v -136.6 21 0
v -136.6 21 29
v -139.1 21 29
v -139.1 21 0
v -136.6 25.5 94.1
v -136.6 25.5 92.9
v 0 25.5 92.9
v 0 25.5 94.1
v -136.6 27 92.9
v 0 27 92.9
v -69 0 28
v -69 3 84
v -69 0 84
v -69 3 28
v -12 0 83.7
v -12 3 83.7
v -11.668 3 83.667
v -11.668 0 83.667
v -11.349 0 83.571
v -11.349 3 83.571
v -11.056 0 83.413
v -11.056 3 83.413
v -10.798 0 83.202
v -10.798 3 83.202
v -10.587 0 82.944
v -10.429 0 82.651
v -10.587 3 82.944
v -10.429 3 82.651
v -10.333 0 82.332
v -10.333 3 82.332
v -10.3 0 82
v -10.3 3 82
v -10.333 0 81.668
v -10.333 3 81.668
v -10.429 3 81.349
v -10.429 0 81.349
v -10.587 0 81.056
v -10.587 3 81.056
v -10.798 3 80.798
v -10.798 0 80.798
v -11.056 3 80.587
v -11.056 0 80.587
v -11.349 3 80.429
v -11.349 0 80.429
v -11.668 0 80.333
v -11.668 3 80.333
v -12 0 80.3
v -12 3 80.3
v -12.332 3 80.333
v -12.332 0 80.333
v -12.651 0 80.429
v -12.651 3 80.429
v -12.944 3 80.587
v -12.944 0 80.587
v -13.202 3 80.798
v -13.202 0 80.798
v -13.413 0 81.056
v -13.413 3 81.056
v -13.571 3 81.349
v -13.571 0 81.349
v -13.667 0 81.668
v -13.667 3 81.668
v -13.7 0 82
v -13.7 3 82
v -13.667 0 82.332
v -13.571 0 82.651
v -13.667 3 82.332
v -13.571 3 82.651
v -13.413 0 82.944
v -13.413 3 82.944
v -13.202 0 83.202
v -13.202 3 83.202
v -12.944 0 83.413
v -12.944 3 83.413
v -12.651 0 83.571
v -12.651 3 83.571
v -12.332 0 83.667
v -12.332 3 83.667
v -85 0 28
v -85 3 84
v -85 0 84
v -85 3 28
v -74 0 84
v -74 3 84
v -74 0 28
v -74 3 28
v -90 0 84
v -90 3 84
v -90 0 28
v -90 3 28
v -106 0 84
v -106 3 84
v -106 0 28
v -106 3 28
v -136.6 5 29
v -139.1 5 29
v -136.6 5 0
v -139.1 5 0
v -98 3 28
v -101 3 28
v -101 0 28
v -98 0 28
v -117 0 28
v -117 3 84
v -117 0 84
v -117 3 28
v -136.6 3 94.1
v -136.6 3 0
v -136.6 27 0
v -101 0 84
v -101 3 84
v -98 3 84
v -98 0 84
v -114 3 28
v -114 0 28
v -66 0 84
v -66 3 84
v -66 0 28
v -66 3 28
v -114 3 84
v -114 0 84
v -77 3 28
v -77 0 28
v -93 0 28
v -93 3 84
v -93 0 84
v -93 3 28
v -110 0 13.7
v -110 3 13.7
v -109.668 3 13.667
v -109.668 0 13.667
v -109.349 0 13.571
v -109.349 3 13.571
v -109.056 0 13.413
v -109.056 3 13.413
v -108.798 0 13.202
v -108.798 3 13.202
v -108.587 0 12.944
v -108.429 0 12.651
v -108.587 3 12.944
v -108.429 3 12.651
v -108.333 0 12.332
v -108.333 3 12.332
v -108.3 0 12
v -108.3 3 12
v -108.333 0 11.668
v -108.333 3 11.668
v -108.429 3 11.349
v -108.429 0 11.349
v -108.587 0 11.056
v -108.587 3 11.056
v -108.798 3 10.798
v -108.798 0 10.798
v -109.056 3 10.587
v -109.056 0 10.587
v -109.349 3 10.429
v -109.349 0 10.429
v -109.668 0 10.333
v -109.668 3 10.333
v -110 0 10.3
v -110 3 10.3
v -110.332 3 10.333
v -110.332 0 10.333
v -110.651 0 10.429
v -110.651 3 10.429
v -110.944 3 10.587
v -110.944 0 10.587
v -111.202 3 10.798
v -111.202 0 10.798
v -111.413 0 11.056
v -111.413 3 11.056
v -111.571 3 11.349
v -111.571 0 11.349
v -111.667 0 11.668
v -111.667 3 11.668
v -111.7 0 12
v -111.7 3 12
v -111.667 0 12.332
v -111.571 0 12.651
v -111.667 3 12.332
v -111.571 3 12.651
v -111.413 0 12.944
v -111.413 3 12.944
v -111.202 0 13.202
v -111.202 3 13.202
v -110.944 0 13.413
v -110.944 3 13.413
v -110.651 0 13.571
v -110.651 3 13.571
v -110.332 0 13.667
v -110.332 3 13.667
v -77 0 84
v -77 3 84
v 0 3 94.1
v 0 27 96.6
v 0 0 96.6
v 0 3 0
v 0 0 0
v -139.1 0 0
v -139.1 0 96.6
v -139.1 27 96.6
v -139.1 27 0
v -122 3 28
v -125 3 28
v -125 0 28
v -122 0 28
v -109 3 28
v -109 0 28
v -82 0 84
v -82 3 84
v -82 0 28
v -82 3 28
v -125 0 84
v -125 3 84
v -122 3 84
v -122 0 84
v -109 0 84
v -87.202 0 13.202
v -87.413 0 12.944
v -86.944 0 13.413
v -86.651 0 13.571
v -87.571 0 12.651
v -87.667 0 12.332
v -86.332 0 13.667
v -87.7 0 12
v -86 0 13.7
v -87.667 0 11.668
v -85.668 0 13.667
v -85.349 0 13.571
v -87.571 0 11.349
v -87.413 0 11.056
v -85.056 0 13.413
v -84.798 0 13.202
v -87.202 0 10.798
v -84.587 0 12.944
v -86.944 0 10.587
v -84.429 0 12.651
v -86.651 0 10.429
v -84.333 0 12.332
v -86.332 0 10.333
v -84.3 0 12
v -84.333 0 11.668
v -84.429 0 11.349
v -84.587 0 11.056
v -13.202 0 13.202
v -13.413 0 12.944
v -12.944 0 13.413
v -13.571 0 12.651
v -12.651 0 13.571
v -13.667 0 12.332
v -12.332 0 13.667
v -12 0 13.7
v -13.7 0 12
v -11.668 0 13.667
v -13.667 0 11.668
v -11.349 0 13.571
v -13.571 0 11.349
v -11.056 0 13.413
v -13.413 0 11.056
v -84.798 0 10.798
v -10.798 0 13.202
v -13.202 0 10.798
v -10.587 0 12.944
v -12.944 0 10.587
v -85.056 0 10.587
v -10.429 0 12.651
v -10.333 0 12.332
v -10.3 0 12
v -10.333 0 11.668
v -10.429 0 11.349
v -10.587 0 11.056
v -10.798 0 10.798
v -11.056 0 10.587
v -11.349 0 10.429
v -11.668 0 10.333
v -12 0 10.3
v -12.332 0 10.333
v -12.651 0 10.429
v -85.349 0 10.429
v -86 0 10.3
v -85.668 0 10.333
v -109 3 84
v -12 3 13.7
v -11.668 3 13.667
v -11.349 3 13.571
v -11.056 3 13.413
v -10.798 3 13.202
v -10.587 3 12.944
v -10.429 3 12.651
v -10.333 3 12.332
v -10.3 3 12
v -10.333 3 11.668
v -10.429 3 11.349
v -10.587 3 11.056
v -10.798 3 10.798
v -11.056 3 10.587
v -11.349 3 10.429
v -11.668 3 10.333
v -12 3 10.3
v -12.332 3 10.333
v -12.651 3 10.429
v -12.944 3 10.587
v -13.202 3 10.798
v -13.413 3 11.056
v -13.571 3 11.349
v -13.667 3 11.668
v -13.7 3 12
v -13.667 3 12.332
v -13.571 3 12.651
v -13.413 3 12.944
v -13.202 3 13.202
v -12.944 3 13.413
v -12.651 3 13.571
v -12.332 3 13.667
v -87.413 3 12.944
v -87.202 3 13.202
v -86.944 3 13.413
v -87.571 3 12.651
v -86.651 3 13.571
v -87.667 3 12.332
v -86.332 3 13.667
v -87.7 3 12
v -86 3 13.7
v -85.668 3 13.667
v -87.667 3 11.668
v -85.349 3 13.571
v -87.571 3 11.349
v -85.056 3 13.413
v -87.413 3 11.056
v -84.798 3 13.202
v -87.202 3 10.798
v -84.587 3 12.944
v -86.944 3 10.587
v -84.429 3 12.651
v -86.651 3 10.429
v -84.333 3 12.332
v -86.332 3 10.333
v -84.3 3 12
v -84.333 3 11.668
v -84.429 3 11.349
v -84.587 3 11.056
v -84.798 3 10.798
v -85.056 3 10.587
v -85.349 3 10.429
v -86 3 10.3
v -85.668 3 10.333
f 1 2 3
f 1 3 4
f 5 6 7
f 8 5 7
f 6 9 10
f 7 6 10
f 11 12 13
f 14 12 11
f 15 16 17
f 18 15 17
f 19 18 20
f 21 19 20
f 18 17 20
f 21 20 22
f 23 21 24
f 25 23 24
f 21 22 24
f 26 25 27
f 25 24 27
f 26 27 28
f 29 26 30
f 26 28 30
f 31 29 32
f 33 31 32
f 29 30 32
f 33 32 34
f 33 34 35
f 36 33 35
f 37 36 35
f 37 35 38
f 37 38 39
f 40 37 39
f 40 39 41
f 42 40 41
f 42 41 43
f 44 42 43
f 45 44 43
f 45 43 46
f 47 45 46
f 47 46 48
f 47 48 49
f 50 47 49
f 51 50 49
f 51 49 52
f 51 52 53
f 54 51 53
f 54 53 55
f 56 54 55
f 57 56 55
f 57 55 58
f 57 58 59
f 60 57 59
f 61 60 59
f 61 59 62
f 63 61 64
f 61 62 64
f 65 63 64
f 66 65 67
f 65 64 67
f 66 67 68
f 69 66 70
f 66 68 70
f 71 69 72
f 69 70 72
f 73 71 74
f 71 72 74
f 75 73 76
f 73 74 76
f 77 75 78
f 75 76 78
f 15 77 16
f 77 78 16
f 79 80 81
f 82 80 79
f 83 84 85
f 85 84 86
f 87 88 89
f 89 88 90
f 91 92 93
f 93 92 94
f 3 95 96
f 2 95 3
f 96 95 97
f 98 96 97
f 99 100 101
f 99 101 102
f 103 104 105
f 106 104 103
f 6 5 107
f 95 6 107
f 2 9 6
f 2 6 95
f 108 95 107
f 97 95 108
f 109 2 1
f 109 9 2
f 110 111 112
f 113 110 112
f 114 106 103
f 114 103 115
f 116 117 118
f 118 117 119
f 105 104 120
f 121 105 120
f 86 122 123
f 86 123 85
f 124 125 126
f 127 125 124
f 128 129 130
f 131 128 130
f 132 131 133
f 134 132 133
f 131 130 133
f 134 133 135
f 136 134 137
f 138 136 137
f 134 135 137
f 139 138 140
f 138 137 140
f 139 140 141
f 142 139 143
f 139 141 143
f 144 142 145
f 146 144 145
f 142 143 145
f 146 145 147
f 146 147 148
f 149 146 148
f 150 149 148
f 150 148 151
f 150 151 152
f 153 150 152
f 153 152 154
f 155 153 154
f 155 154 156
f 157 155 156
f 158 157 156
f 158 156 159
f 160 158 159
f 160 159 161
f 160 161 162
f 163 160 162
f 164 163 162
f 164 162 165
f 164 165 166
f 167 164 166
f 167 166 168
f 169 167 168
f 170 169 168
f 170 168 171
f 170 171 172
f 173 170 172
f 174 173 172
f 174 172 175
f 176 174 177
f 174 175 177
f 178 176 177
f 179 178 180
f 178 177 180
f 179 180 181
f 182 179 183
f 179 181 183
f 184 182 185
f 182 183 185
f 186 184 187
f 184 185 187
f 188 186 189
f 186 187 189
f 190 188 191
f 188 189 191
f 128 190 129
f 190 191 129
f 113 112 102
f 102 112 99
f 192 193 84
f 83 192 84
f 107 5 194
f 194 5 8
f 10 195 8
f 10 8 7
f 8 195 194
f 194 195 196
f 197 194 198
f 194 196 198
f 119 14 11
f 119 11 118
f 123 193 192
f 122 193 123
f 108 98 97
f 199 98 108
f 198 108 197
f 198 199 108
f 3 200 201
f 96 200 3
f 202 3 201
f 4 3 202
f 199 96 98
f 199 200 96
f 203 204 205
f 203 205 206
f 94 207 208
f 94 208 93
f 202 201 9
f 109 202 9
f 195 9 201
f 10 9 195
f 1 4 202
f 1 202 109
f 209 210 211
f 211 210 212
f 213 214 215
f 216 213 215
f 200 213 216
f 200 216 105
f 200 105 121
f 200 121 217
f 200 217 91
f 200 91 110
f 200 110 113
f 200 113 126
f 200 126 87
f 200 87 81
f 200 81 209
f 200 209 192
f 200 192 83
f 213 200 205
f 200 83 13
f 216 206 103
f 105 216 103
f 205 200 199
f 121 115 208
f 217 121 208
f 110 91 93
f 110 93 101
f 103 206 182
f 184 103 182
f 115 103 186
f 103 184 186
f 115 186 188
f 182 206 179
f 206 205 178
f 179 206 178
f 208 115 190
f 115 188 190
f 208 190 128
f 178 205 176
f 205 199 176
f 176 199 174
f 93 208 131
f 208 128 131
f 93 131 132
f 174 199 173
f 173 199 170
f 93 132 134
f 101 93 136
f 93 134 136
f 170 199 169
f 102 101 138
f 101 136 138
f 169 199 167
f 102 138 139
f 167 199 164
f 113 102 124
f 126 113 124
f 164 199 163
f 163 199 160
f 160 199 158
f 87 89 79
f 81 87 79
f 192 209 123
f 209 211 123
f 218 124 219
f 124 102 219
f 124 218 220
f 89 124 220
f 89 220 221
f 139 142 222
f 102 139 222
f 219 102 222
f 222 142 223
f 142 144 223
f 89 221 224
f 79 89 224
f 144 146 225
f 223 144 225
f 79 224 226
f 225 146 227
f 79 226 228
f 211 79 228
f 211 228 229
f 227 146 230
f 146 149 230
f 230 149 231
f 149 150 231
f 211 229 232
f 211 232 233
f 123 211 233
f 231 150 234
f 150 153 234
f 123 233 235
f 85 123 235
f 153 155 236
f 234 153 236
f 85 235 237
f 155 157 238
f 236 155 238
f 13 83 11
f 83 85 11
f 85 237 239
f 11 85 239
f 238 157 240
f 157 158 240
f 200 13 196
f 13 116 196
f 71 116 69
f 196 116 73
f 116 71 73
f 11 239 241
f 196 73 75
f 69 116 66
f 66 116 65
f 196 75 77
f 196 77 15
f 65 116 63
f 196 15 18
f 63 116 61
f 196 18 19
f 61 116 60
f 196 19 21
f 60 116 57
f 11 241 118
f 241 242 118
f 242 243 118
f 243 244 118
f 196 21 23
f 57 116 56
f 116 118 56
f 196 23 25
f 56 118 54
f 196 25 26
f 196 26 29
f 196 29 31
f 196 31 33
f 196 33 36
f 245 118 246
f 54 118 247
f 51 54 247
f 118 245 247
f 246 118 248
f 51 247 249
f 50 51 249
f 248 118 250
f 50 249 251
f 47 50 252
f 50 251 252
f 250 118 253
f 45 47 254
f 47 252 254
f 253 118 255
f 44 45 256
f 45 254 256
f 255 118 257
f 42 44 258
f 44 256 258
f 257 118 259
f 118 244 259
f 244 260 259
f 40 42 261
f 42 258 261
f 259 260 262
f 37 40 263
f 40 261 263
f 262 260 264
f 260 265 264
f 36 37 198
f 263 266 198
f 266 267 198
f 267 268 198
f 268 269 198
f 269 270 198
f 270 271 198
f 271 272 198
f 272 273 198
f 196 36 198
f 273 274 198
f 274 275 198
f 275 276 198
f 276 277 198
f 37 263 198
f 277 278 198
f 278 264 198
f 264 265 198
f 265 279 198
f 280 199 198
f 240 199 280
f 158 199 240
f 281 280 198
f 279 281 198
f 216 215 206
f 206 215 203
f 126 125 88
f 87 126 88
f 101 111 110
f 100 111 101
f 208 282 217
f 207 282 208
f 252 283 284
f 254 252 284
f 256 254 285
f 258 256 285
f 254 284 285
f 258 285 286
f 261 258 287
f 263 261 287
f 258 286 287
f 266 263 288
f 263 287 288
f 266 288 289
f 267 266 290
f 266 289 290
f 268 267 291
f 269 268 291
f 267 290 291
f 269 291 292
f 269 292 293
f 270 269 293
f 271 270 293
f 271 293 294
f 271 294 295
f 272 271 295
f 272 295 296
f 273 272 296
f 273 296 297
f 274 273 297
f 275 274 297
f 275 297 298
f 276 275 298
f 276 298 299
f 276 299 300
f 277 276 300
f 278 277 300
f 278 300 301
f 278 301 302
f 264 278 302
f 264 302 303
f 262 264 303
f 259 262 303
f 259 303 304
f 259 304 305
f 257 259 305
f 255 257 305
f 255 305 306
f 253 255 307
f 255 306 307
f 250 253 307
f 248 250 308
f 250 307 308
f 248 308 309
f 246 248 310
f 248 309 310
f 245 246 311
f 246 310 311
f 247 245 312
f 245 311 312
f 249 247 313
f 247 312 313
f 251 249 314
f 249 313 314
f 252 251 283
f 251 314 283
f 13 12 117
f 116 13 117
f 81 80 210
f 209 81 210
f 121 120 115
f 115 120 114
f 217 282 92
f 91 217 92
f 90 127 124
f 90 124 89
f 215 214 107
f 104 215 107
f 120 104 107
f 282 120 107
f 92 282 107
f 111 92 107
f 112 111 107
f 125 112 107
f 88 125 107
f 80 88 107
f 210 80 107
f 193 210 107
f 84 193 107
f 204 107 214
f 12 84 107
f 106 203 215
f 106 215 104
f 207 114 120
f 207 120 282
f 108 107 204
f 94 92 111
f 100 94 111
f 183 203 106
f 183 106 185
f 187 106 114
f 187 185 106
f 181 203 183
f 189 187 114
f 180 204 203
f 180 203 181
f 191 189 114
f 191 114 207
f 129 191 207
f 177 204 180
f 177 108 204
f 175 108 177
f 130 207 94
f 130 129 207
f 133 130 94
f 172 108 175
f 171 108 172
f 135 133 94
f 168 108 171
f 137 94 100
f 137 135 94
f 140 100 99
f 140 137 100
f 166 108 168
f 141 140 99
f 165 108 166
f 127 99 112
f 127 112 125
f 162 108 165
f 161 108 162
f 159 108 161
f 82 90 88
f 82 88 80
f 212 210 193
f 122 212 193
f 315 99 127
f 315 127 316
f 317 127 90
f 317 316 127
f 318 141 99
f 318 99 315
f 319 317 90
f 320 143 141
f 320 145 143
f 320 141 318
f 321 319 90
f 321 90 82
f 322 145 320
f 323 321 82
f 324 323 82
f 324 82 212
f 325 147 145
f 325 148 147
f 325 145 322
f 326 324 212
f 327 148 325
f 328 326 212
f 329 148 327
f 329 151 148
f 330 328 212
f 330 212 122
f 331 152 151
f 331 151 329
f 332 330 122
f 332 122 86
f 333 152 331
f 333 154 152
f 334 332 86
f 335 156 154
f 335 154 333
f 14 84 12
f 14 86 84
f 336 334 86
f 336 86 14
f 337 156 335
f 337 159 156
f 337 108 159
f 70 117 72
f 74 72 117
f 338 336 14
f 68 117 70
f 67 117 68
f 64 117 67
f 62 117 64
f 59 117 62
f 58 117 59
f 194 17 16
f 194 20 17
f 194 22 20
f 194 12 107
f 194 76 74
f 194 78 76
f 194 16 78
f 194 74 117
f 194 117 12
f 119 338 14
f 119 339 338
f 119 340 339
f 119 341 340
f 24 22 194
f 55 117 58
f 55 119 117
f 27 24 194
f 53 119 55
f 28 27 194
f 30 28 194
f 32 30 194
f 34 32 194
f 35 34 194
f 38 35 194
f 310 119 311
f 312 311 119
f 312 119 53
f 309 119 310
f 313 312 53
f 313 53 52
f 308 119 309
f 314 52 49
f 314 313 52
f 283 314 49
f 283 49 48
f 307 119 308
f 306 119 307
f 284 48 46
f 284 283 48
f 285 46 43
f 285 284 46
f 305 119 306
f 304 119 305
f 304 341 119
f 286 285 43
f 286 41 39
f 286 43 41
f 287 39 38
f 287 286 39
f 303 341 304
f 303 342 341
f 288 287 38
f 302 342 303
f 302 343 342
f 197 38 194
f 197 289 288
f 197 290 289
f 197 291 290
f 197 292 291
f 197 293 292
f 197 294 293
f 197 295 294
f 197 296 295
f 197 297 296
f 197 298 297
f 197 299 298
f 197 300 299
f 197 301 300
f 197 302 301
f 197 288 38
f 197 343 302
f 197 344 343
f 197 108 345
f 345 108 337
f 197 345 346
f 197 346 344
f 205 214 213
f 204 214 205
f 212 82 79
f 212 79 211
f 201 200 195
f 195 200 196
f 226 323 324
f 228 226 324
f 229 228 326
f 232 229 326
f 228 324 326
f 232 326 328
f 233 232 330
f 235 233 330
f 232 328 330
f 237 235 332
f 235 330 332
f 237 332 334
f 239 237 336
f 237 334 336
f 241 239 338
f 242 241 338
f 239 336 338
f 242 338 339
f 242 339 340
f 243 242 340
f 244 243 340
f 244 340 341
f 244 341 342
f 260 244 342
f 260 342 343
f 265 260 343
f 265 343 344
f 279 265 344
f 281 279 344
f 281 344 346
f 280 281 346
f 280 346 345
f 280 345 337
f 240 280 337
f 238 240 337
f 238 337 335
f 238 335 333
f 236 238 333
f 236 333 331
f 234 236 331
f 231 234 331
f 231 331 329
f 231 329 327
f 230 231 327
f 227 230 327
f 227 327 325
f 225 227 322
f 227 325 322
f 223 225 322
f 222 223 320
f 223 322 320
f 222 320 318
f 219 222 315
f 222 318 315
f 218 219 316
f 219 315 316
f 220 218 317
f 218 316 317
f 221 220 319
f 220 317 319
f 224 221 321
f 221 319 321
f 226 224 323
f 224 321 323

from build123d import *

# Parameters (mm, degrees)
SKETCH1_W                     = 278.2
SKETCH1_H                     = 193.2
SHELL_BLOCK_DEPTH             = 27
SKETCH2_W                     = 273.2
SKETCH2_H                     = 185.8
FRONT_OPENING_DEPTH           = 1.5
SKETCH3_W                     = 273.2
SKETCH3_H                     = 188.2
DISPLAY_POCKET_DEPTH          = 22.5
SKETCH4_W                     = 3
SKETCH4_H                     = 56
VENT_SLOTS_DEPTH              = 4
SKETCH5_W                     = 58
SKETCH5_H                     = 16
CABLE_EXIT_X_SHORT_SIDE_DEPTH = 140.1
SKETCH6_R                     = 1.7
BOLT_HOLES_DEPTH              = 4
KEEP_ONE_HALF_X_DEPTH         = 172.491603293
KEEP_ONE_HALF_X_DEPTH_BACK    = 172.491603293
SKETCH7_W                     = 200
SKETCH7_H                     = 400
KEEP_ONE_QUARTER_Z_DEPTH      = 172.491603293
KEEP_ONE_QUARTER_Z_DEPTH_BACK = 172.491603293
SKETCH8_W                     = 400
SKETCH8_H                     = 200


with BuildPart() as part:
    # Sketch1 → Shell Block (new body)
    with BuildSketch(Plane(origin=(0, 0, 0), x_dir=(1, 0, 0), z_dir=(0, 1, 0))):
        Rectangle(SKETCH1_W, SKETCH1_H)
    extrude(amount=SHELL_BLOCK_DEPTH)

    # Sketch2 → Front Opening (cut)
    with BuildSketch(Plane(origin=(0, 27, 0), x_dir=(1, 0, 0), z_dir=(0, 1, 0))):
        Rectangle(SKETCH2_W, SKETCH2_H)
    extrude(amount=-FRONT_OPENING_DEPTH, mode=Mode.SUBTRACT)

    # Sketch3 → Display Pocket (cut)
    with BuildSketch(Plane(origin=(0, 25.5, 0), x_dir=(1, 0, 0), z_dir=(0, 1, 0))):
        Rectangle(SKETCH3_W, SKETCH3_H)
    extrude(amount=-DISPLAY_POCKET_DEPTH, mode=Mode.SUBTRACT)

    # Sketch4 → Vent Slots (cut)
    with BuildSketch(Plane(origin=(0, 3, 0), x_dir=(1, 0, 0), z_dir=(0, 1, 0))):
        with Locations((-67.5, 56)):
            Rectangle(SKETCH4_W, SKETCH4_H)
        with Locations((-67.5, -56)):
            Rectangle(SKETCH4_W, SKETCH4_H)
        with Locations((-75.5, 56)):
            Rectangle(SKETCH4_W, SKETCH4_H)
        with Locations((-75.5, -56)):
            Rectangle(SKETCH4_W, SKETCH4_H)
        with Locations((-83.5, 56)):
            Rectangle(SKETCH4_W, SKETCH4_H)
        with Locations((-83.5, -56)):
            Rectangle(SKETCH4_W, SKETCH4_H)
        with Locations((-91.5, 56)):
            Rectangle(SKETCH4_W, SKETCH4_H)
        with Locations((-91.5, -56)):
            Rectangle(SKETCH4_W, SKETCH4_H)
        with Locations((-99.5, 56)):
            Rectangle(SKETCH4_W, SKETCH4_H)
        with Locations((-99.5, -56)):
            Rectangle(SKETCH4_W, SKETCH4_H)
        with Locations((-107.5, 56)):
            Rectangle(SKETCH4_W, SKETCH4_H)
        with Locations((-107.5, -56)):
            Rectangle(SKETCH4_W, SKETCH4_H)
        with Locations((-115.5, 56)):
            Rectangle(SKETCH4_W, SKETCH4_H)
        with Locations((-115.5, -56)):
            Rectangle(SKETCH4_W, SKETCH4_H)
        with Locations((-123.5, 56)):
            Rectangle(SKETCH4_W, SKETCH4_H)
        with Locations((-123.5, -56)):
            Rectangle(SKETCH4_W, SKETCH4_H)
    extrude(amount=-VENT_SLOTS_DEPTH, mode=Mode.SUBTRACT)

    # Sketch5 → Cable Exit (-X short side) (cut)
    with BuildSketch(Plane(origin=(0, 0, 0), x_dir=(0, 0, -1), z_dir=(1, 0, 0))):
        with Locations((0, 13)):
            Rectangle(SKETCH5_W, SKETCH5_H)
    extrude(amount=-CABLE_EXIT_X_SHORT_SIDE_DEPTH, mode=Mode.SUBTRACT)

    # Sketch6 → Bolt Holes (cut)
    with BuildSketch(Plane(origin=(0, 3, 0), x_dir=(1, 0, 0), z_dir=(0, 1, 0))):
        with Locations(Location((-40, 18, 0), (0, 0, 270))):
            Circle(SKETCH6_R)
        with Locations(Location((-40, 88, 0), (0, 0, 270))):
            Circle(SKETCH6_R)
        with Locations(Location((40, 18, 0), (0, 0, 270))):
            Circle(SKETCH6_R)
        with Locations(Location((40, 88, 0), (0, 0, 270))):
            Circle(SKETCH6_R)
        with Locations(Location((-52, 40, 0), (0, 0, 270))):
            Circle(SKETCH6_R)
        with Locations(Location((-52, 66, 0), (0, 0, 270))):
            Circle(SKETCH6_R)
        with Locations(Location((52, 40, 0), (0, 0, 270))):
            Circle(SKETCH6_R)
        with Locations(Location((52, 66, 0), (0, 0, 270))):
            Circle(SKETCH6_R)
        with Locations(Location((-12, -82, 0), (0, 0, 270))):
            Circle(SKETCH6_R)
        with Locations(Location((12, -82, 0), (0, 0, 270))):
            Circle(SKETCH6_R)
        with Locations(Location((124, -12, 0), (0, 0, 270))):
            Circle(SKETCH6_R)
        with Locations(Location((124, 12, 0), (0, 0, 270))):
            Circle(SKETCH6_R)
        with Locations(Location((-12, -12, 0), (0, 0, 270))):
            Circle(SKETCH6_R)
        with Locations(Location((-12, 12, 0), (0, 0, 270))):
            Circle(SKETCH6_R)
        with Locations(Location((12, -12, 0), (0, 0, 270))):
            Circle(SKETCH6_R)
        with Locations(Location((12, 12, 0), (0, 0, 270))):
            Circle(SKETCH6_R)
        with Locations(Location((-110, 12, 0), (0, 0, 270))):
            Circle(SKETCH6_R)
        with Locations(Location((-110, -12, 0), (0, 0, 270))):
            Circle(SKETCH6_R)
        with Locations(Location((-86, 12, 0), (0, 0, 270))):
            Circle(SKETCH6_R)
        with Locations(Location((-86, -12, 0), (0, 0, 270))):
            Circle(SKETCH6_R)
    extrude(amount=-BOLT_HOLES_DEPTH, mode=Mode.SUBTRACT)

    # Sketch7 → Keep one half (X) (cut, two sides: drawn at the far end of the back side and taken through both)
    with BuildSketch(Plane(origin=(0, 0, 0), x_dir=(1, 0, 0), z_dir=(0, 1, 0)).offset(-KEEP_ONE_HALF_X_DEPTH_BACK)):
        with Locations((100, 0)):
            Rectangle(SKETCH7_W, SKETCH7_H)
    extrude(amount=KEEP_ONE_HALF_X_DEPTH + KEEP_ONE_HALF_X_DEPTH_BACK, mode=Mode.SUBTRACT)

    # Sketch8 → Keep one quarter (Z) (cut, two sides: drawn at the far end of the back side and taken through both)
    with BuildSketch(Plane(origin=(0, 0, 0), x_dir=(1, 0, 0), z_dir=(0, 1, 0)).offset(-KEEP_ONE_QUARTER_Z_DEPTH_BACK)):
        with Locations((0, 100)):
            Rectangle(SKETCH8_W, SKETCH8_H)
    extrude(amount=KEEP_ONE_QUARTER_Z_DEPTH + KEEP_ONE_QUARTER_Z_DEPTH_BACK, mode=Mode.SUBTRACT)


solid = part.part
